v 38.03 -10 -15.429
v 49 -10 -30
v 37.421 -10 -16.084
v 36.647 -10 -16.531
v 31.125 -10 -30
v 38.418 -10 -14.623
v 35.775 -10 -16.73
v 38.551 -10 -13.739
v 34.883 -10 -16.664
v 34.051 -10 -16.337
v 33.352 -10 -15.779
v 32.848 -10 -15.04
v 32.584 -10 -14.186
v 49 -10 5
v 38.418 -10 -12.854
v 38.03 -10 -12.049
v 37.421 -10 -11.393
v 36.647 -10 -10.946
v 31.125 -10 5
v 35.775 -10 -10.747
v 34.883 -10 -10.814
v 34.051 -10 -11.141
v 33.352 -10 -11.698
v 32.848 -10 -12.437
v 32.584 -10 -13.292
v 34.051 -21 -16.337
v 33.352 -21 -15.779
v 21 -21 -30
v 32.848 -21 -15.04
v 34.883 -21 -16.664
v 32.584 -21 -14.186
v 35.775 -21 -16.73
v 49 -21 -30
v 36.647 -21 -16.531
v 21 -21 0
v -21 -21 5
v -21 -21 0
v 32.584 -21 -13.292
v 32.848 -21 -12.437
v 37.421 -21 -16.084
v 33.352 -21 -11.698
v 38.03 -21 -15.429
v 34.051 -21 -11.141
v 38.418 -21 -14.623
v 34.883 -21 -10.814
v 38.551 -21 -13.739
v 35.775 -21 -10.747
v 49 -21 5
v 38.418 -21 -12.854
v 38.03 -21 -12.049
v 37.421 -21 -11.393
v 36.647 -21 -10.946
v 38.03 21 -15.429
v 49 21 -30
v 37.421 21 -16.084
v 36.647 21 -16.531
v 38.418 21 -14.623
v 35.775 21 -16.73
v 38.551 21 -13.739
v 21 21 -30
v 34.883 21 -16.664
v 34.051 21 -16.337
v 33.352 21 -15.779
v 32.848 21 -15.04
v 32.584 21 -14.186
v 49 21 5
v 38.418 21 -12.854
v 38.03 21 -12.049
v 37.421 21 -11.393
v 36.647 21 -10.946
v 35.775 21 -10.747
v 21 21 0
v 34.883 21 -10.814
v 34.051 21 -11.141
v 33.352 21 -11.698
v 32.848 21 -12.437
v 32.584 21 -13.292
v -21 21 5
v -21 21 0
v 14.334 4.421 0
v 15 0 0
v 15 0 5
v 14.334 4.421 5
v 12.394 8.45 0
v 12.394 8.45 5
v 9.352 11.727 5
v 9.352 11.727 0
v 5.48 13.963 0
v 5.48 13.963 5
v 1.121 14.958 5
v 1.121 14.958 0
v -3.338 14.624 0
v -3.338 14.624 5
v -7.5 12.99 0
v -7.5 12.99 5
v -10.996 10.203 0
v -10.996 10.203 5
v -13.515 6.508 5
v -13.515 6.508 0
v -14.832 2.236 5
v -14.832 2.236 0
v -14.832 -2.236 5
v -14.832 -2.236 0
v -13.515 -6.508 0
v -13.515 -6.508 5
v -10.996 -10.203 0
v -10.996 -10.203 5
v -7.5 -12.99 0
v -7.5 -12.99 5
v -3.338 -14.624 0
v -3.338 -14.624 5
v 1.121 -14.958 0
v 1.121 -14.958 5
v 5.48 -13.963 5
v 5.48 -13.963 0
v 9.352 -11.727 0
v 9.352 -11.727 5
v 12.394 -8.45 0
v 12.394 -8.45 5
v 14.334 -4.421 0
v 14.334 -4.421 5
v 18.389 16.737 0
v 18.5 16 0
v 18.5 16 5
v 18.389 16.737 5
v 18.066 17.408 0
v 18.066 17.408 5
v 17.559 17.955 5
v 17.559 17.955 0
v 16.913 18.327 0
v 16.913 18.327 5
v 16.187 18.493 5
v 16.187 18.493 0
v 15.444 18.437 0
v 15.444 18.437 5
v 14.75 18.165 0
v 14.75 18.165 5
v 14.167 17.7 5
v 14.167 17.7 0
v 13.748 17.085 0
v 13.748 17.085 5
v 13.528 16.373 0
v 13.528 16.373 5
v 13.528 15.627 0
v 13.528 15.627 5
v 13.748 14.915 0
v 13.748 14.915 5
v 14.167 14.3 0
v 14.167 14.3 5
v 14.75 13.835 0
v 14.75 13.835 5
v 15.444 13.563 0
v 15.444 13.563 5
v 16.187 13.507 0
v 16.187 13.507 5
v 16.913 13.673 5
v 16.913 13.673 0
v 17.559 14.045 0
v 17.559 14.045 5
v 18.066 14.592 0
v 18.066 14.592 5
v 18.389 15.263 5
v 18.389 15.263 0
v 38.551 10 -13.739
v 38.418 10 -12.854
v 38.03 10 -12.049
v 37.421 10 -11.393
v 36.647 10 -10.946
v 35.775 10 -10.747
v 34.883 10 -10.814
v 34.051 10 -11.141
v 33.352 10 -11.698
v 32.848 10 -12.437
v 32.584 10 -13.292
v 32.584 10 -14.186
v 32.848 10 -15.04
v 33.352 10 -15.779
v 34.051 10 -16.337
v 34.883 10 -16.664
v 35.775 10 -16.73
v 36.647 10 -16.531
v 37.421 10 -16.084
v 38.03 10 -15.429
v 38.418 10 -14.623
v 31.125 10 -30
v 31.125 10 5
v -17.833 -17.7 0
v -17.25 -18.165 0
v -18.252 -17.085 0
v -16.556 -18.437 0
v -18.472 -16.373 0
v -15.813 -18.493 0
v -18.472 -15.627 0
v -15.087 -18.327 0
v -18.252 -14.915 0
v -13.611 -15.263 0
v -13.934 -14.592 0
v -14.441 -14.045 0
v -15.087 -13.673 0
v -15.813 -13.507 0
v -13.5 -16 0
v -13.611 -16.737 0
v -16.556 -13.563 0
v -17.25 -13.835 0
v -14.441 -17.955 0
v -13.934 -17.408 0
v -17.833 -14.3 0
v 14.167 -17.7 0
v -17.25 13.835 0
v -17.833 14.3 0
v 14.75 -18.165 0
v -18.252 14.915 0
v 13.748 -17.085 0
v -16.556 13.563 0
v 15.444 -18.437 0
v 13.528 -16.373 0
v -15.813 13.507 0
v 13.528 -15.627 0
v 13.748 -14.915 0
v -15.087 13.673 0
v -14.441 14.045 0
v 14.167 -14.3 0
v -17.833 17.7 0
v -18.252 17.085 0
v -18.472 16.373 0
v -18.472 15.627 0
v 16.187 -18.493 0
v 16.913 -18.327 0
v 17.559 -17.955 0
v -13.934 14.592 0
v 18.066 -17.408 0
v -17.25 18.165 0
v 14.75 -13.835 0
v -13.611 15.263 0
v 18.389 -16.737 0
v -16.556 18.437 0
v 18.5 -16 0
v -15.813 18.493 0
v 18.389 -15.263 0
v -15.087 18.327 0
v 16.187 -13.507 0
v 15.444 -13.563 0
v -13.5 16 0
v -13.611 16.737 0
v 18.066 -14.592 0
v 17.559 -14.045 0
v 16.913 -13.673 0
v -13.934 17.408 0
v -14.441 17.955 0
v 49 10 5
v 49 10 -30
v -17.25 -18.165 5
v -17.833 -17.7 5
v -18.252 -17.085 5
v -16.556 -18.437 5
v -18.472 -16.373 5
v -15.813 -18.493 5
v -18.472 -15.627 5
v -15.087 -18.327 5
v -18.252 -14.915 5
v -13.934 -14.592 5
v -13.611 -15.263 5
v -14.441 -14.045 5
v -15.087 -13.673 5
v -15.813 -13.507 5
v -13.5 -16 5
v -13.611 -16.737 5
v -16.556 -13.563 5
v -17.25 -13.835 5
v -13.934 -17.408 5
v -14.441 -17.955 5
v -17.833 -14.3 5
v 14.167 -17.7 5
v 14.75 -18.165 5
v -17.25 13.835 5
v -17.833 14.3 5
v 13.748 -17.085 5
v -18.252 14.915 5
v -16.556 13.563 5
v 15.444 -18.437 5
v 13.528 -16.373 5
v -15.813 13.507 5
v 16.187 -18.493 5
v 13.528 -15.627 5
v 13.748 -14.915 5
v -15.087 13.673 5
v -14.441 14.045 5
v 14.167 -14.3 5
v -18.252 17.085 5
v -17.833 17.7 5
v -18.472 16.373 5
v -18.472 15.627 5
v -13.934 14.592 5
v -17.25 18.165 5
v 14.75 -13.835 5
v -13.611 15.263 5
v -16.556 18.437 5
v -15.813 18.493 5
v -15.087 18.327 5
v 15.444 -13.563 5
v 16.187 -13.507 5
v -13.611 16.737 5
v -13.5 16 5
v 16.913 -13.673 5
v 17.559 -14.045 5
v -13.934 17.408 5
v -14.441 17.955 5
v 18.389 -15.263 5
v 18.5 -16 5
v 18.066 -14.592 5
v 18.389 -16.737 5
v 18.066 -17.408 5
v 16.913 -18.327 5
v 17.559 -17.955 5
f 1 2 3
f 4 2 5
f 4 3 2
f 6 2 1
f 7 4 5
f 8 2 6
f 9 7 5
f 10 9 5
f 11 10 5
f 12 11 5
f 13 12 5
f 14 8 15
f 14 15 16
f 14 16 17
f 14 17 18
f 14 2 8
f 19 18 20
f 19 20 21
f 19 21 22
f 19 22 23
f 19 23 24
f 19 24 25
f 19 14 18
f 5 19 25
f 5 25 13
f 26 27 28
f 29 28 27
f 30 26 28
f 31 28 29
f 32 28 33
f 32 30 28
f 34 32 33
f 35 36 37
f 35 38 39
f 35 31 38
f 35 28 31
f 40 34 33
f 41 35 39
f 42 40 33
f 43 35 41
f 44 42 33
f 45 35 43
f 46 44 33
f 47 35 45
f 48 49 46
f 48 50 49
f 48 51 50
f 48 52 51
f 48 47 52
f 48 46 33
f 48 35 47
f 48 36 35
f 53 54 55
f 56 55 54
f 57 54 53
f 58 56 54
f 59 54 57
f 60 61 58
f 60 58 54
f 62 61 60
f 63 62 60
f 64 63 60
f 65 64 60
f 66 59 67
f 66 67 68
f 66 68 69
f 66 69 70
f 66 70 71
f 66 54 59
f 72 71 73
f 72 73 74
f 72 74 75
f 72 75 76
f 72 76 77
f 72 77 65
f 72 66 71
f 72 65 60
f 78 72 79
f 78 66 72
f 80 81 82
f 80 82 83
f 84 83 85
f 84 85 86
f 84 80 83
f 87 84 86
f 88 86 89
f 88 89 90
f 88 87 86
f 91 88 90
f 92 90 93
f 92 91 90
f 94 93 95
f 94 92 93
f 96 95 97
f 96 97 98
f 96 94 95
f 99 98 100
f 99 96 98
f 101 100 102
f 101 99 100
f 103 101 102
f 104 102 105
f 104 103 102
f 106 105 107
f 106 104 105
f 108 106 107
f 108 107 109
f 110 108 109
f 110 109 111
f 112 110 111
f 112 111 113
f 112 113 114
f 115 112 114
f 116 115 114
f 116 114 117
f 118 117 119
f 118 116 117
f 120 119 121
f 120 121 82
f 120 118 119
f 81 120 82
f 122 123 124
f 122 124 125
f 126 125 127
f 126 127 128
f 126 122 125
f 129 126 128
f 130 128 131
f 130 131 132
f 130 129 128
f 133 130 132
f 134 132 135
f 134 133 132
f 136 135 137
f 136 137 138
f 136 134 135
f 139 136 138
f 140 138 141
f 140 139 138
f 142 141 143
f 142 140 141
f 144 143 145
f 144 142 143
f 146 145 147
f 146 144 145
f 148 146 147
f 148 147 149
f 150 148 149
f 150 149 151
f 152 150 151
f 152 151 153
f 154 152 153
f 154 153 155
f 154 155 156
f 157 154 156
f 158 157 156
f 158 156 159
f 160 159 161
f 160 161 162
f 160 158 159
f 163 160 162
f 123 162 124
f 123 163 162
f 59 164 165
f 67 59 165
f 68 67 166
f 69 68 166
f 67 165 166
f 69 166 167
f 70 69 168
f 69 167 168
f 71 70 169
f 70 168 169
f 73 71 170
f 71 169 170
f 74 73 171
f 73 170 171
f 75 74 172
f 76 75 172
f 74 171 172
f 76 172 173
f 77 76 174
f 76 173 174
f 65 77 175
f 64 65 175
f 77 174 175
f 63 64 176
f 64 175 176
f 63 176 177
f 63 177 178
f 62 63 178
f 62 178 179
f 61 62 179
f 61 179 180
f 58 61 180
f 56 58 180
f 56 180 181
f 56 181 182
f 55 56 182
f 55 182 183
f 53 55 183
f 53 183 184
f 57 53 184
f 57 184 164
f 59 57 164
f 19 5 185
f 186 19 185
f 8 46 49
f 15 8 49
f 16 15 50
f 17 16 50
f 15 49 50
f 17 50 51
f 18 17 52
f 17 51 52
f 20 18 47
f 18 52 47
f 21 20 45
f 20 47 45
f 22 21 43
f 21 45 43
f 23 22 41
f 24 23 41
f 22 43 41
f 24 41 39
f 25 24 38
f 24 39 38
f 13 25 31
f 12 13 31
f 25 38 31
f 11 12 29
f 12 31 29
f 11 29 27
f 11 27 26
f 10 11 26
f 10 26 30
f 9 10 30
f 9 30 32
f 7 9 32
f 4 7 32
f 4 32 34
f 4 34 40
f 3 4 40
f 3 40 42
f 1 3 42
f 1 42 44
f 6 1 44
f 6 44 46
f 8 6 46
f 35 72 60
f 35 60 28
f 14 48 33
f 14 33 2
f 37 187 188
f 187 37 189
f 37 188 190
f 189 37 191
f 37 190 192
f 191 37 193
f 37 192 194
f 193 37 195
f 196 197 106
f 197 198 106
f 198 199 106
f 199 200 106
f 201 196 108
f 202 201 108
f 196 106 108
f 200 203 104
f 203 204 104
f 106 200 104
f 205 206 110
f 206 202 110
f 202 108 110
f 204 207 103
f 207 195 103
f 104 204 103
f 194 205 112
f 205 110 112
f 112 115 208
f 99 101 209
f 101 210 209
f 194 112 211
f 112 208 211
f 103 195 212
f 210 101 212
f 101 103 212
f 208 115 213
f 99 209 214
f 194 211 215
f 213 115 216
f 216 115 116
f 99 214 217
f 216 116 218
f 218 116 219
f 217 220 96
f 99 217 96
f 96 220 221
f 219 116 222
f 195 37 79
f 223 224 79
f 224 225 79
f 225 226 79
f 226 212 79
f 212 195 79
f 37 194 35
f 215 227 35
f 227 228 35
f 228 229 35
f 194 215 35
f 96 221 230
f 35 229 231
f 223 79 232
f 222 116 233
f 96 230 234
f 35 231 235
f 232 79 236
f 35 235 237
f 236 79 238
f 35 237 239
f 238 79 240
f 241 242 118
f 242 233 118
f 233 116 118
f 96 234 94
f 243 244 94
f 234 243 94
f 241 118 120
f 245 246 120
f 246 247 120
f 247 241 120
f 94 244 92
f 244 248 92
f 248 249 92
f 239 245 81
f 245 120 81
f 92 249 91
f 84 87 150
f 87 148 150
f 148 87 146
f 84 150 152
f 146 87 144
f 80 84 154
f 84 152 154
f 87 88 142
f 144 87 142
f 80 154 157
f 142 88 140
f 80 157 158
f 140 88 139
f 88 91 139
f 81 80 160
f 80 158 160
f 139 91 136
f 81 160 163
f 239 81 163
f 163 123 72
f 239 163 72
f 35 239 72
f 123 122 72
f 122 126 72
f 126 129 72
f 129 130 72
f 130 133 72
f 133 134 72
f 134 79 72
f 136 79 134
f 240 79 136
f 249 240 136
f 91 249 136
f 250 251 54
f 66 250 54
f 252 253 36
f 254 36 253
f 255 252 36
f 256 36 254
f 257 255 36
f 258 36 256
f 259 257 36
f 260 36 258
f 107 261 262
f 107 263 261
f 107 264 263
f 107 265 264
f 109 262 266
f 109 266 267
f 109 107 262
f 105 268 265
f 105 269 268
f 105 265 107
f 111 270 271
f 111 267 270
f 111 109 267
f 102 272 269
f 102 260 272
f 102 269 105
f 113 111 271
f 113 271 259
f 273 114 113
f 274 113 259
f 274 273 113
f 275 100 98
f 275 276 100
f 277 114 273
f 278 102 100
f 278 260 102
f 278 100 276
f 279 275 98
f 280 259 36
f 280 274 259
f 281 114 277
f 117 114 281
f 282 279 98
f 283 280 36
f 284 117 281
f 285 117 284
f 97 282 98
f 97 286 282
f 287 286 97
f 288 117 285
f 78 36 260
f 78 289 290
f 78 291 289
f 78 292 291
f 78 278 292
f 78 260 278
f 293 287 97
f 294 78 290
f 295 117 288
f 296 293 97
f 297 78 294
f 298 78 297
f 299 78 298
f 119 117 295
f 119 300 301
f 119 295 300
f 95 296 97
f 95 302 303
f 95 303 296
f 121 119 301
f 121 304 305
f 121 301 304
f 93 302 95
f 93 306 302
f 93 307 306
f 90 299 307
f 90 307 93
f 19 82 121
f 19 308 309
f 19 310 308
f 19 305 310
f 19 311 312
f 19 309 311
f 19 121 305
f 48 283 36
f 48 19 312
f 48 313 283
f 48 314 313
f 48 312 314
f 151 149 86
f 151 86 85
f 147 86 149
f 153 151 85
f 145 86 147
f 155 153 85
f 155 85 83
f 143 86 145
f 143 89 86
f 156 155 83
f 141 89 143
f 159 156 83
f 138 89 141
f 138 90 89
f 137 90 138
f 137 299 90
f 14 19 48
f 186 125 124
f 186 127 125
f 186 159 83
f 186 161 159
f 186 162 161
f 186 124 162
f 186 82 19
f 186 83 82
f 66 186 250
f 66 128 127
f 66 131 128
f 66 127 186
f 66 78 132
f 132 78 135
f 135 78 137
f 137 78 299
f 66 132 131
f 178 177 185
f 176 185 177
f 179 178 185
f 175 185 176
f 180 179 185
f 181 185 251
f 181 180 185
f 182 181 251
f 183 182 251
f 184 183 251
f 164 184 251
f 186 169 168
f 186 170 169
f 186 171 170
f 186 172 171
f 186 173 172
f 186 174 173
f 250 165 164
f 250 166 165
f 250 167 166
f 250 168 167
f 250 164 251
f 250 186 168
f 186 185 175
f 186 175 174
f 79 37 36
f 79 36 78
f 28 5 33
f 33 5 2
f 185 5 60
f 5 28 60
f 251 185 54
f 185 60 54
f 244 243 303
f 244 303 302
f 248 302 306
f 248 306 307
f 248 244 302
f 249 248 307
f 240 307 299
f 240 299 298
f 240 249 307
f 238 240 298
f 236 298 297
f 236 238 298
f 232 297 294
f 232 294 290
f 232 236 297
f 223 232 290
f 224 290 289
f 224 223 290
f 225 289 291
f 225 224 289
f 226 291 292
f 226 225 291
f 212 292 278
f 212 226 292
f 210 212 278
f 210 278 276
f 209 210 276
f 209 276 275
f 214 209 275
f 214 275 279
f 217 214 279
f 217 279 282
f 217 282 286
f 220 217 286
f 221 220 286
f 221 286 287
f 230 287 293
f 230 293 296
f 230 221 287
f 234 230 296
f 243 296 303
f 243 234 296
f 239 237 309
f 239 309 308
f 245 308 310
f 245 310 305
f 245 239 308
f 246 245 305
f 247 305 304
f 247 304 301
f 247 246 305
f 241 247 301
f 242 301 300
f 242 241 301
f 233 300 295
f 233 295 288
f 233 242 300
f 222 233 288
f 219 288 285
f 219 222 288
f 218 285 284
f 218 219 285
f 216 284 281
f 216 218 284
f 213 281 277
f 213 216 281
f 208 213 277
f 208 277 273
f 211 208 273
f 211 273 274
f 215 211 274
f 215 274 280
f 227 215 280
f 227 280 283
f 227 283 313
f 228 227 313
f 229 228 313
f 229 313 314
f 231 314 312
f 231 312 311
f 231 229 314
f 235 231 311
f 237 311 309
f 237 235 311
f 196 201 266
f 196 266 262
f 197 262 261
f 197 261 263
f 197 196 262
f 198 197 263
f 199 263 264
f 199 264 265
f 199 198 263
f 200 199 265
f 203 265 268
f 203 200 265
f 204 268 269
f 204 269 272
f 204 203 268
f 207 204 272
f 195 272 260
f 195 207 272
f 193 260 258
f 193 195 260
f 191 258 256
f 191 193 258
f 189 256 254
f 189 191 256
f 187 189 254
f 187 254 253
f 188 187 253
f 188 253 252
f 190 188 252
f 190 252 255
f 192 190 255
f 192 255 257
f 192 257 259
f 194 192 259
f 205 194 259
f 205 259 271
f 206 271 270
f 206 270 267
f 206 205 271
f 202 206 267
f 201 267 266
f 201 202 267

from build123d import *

# Parameters (mm, degrees)
F0_W          = 42
F0_H          = 42
F0_R          = 2.5
F0_R_2        = 15
F1_DEPTH      = 5
F2_DEPTH      = 5
F2_DEPTH_BACK = 30
F3_R          = 3
F4_DEPTH      = 50


with BuildPart() as f1:
    # F0 (on Top) → F1 (new body)
    with BuildSketch(Plane.XY):
        Rectangle(F0_W, F0_H)
        with Locations((-16.000001, -16.000001)):
            Circle(F0_R, mode=Mode.SUBTRACT)
        with Locations((16.000001, -16.000001)):
            Circle(F0_R, mode=Mode.SUBTRACT)
        Circle(F0_R_2, mode=Mode.SUBTRACT)
        with Locations((-16.000001, 16.000001)):
            Circle(F0_R, mode=Mode.SUBTRACT)
        with Locations((16.000001, 16.000001)):
            Circle(F0_R, mode=Mode.SUBTRACT)
    extrude(amount=F1_DEPTH)

    # F0 (on Top) → F2 (join, two sides)
    with BuildSketch(Plane.XY) as f2_sk:
        Polygon((49, 21), (21, 21), (21, -21), (49, -21), (49, -10), (31.125, -10), (31.125, 10), (49, 10), align=None)
    extrude(amount=F2_DEPTH)
    extrude(f2_sk.sketch, amount=-F2_DEPTH_BACK)

    # F3 (on face) → F4 (cut)
    with BuildSketch(Plane.XZ.offset(21)):
        with Locations((35.550814, -13.738759)):
            Circle(F3_R)
    extrude(amount=-F4_DEPTH, mode=Mode.SUBTRACT)


solid = f1.part
